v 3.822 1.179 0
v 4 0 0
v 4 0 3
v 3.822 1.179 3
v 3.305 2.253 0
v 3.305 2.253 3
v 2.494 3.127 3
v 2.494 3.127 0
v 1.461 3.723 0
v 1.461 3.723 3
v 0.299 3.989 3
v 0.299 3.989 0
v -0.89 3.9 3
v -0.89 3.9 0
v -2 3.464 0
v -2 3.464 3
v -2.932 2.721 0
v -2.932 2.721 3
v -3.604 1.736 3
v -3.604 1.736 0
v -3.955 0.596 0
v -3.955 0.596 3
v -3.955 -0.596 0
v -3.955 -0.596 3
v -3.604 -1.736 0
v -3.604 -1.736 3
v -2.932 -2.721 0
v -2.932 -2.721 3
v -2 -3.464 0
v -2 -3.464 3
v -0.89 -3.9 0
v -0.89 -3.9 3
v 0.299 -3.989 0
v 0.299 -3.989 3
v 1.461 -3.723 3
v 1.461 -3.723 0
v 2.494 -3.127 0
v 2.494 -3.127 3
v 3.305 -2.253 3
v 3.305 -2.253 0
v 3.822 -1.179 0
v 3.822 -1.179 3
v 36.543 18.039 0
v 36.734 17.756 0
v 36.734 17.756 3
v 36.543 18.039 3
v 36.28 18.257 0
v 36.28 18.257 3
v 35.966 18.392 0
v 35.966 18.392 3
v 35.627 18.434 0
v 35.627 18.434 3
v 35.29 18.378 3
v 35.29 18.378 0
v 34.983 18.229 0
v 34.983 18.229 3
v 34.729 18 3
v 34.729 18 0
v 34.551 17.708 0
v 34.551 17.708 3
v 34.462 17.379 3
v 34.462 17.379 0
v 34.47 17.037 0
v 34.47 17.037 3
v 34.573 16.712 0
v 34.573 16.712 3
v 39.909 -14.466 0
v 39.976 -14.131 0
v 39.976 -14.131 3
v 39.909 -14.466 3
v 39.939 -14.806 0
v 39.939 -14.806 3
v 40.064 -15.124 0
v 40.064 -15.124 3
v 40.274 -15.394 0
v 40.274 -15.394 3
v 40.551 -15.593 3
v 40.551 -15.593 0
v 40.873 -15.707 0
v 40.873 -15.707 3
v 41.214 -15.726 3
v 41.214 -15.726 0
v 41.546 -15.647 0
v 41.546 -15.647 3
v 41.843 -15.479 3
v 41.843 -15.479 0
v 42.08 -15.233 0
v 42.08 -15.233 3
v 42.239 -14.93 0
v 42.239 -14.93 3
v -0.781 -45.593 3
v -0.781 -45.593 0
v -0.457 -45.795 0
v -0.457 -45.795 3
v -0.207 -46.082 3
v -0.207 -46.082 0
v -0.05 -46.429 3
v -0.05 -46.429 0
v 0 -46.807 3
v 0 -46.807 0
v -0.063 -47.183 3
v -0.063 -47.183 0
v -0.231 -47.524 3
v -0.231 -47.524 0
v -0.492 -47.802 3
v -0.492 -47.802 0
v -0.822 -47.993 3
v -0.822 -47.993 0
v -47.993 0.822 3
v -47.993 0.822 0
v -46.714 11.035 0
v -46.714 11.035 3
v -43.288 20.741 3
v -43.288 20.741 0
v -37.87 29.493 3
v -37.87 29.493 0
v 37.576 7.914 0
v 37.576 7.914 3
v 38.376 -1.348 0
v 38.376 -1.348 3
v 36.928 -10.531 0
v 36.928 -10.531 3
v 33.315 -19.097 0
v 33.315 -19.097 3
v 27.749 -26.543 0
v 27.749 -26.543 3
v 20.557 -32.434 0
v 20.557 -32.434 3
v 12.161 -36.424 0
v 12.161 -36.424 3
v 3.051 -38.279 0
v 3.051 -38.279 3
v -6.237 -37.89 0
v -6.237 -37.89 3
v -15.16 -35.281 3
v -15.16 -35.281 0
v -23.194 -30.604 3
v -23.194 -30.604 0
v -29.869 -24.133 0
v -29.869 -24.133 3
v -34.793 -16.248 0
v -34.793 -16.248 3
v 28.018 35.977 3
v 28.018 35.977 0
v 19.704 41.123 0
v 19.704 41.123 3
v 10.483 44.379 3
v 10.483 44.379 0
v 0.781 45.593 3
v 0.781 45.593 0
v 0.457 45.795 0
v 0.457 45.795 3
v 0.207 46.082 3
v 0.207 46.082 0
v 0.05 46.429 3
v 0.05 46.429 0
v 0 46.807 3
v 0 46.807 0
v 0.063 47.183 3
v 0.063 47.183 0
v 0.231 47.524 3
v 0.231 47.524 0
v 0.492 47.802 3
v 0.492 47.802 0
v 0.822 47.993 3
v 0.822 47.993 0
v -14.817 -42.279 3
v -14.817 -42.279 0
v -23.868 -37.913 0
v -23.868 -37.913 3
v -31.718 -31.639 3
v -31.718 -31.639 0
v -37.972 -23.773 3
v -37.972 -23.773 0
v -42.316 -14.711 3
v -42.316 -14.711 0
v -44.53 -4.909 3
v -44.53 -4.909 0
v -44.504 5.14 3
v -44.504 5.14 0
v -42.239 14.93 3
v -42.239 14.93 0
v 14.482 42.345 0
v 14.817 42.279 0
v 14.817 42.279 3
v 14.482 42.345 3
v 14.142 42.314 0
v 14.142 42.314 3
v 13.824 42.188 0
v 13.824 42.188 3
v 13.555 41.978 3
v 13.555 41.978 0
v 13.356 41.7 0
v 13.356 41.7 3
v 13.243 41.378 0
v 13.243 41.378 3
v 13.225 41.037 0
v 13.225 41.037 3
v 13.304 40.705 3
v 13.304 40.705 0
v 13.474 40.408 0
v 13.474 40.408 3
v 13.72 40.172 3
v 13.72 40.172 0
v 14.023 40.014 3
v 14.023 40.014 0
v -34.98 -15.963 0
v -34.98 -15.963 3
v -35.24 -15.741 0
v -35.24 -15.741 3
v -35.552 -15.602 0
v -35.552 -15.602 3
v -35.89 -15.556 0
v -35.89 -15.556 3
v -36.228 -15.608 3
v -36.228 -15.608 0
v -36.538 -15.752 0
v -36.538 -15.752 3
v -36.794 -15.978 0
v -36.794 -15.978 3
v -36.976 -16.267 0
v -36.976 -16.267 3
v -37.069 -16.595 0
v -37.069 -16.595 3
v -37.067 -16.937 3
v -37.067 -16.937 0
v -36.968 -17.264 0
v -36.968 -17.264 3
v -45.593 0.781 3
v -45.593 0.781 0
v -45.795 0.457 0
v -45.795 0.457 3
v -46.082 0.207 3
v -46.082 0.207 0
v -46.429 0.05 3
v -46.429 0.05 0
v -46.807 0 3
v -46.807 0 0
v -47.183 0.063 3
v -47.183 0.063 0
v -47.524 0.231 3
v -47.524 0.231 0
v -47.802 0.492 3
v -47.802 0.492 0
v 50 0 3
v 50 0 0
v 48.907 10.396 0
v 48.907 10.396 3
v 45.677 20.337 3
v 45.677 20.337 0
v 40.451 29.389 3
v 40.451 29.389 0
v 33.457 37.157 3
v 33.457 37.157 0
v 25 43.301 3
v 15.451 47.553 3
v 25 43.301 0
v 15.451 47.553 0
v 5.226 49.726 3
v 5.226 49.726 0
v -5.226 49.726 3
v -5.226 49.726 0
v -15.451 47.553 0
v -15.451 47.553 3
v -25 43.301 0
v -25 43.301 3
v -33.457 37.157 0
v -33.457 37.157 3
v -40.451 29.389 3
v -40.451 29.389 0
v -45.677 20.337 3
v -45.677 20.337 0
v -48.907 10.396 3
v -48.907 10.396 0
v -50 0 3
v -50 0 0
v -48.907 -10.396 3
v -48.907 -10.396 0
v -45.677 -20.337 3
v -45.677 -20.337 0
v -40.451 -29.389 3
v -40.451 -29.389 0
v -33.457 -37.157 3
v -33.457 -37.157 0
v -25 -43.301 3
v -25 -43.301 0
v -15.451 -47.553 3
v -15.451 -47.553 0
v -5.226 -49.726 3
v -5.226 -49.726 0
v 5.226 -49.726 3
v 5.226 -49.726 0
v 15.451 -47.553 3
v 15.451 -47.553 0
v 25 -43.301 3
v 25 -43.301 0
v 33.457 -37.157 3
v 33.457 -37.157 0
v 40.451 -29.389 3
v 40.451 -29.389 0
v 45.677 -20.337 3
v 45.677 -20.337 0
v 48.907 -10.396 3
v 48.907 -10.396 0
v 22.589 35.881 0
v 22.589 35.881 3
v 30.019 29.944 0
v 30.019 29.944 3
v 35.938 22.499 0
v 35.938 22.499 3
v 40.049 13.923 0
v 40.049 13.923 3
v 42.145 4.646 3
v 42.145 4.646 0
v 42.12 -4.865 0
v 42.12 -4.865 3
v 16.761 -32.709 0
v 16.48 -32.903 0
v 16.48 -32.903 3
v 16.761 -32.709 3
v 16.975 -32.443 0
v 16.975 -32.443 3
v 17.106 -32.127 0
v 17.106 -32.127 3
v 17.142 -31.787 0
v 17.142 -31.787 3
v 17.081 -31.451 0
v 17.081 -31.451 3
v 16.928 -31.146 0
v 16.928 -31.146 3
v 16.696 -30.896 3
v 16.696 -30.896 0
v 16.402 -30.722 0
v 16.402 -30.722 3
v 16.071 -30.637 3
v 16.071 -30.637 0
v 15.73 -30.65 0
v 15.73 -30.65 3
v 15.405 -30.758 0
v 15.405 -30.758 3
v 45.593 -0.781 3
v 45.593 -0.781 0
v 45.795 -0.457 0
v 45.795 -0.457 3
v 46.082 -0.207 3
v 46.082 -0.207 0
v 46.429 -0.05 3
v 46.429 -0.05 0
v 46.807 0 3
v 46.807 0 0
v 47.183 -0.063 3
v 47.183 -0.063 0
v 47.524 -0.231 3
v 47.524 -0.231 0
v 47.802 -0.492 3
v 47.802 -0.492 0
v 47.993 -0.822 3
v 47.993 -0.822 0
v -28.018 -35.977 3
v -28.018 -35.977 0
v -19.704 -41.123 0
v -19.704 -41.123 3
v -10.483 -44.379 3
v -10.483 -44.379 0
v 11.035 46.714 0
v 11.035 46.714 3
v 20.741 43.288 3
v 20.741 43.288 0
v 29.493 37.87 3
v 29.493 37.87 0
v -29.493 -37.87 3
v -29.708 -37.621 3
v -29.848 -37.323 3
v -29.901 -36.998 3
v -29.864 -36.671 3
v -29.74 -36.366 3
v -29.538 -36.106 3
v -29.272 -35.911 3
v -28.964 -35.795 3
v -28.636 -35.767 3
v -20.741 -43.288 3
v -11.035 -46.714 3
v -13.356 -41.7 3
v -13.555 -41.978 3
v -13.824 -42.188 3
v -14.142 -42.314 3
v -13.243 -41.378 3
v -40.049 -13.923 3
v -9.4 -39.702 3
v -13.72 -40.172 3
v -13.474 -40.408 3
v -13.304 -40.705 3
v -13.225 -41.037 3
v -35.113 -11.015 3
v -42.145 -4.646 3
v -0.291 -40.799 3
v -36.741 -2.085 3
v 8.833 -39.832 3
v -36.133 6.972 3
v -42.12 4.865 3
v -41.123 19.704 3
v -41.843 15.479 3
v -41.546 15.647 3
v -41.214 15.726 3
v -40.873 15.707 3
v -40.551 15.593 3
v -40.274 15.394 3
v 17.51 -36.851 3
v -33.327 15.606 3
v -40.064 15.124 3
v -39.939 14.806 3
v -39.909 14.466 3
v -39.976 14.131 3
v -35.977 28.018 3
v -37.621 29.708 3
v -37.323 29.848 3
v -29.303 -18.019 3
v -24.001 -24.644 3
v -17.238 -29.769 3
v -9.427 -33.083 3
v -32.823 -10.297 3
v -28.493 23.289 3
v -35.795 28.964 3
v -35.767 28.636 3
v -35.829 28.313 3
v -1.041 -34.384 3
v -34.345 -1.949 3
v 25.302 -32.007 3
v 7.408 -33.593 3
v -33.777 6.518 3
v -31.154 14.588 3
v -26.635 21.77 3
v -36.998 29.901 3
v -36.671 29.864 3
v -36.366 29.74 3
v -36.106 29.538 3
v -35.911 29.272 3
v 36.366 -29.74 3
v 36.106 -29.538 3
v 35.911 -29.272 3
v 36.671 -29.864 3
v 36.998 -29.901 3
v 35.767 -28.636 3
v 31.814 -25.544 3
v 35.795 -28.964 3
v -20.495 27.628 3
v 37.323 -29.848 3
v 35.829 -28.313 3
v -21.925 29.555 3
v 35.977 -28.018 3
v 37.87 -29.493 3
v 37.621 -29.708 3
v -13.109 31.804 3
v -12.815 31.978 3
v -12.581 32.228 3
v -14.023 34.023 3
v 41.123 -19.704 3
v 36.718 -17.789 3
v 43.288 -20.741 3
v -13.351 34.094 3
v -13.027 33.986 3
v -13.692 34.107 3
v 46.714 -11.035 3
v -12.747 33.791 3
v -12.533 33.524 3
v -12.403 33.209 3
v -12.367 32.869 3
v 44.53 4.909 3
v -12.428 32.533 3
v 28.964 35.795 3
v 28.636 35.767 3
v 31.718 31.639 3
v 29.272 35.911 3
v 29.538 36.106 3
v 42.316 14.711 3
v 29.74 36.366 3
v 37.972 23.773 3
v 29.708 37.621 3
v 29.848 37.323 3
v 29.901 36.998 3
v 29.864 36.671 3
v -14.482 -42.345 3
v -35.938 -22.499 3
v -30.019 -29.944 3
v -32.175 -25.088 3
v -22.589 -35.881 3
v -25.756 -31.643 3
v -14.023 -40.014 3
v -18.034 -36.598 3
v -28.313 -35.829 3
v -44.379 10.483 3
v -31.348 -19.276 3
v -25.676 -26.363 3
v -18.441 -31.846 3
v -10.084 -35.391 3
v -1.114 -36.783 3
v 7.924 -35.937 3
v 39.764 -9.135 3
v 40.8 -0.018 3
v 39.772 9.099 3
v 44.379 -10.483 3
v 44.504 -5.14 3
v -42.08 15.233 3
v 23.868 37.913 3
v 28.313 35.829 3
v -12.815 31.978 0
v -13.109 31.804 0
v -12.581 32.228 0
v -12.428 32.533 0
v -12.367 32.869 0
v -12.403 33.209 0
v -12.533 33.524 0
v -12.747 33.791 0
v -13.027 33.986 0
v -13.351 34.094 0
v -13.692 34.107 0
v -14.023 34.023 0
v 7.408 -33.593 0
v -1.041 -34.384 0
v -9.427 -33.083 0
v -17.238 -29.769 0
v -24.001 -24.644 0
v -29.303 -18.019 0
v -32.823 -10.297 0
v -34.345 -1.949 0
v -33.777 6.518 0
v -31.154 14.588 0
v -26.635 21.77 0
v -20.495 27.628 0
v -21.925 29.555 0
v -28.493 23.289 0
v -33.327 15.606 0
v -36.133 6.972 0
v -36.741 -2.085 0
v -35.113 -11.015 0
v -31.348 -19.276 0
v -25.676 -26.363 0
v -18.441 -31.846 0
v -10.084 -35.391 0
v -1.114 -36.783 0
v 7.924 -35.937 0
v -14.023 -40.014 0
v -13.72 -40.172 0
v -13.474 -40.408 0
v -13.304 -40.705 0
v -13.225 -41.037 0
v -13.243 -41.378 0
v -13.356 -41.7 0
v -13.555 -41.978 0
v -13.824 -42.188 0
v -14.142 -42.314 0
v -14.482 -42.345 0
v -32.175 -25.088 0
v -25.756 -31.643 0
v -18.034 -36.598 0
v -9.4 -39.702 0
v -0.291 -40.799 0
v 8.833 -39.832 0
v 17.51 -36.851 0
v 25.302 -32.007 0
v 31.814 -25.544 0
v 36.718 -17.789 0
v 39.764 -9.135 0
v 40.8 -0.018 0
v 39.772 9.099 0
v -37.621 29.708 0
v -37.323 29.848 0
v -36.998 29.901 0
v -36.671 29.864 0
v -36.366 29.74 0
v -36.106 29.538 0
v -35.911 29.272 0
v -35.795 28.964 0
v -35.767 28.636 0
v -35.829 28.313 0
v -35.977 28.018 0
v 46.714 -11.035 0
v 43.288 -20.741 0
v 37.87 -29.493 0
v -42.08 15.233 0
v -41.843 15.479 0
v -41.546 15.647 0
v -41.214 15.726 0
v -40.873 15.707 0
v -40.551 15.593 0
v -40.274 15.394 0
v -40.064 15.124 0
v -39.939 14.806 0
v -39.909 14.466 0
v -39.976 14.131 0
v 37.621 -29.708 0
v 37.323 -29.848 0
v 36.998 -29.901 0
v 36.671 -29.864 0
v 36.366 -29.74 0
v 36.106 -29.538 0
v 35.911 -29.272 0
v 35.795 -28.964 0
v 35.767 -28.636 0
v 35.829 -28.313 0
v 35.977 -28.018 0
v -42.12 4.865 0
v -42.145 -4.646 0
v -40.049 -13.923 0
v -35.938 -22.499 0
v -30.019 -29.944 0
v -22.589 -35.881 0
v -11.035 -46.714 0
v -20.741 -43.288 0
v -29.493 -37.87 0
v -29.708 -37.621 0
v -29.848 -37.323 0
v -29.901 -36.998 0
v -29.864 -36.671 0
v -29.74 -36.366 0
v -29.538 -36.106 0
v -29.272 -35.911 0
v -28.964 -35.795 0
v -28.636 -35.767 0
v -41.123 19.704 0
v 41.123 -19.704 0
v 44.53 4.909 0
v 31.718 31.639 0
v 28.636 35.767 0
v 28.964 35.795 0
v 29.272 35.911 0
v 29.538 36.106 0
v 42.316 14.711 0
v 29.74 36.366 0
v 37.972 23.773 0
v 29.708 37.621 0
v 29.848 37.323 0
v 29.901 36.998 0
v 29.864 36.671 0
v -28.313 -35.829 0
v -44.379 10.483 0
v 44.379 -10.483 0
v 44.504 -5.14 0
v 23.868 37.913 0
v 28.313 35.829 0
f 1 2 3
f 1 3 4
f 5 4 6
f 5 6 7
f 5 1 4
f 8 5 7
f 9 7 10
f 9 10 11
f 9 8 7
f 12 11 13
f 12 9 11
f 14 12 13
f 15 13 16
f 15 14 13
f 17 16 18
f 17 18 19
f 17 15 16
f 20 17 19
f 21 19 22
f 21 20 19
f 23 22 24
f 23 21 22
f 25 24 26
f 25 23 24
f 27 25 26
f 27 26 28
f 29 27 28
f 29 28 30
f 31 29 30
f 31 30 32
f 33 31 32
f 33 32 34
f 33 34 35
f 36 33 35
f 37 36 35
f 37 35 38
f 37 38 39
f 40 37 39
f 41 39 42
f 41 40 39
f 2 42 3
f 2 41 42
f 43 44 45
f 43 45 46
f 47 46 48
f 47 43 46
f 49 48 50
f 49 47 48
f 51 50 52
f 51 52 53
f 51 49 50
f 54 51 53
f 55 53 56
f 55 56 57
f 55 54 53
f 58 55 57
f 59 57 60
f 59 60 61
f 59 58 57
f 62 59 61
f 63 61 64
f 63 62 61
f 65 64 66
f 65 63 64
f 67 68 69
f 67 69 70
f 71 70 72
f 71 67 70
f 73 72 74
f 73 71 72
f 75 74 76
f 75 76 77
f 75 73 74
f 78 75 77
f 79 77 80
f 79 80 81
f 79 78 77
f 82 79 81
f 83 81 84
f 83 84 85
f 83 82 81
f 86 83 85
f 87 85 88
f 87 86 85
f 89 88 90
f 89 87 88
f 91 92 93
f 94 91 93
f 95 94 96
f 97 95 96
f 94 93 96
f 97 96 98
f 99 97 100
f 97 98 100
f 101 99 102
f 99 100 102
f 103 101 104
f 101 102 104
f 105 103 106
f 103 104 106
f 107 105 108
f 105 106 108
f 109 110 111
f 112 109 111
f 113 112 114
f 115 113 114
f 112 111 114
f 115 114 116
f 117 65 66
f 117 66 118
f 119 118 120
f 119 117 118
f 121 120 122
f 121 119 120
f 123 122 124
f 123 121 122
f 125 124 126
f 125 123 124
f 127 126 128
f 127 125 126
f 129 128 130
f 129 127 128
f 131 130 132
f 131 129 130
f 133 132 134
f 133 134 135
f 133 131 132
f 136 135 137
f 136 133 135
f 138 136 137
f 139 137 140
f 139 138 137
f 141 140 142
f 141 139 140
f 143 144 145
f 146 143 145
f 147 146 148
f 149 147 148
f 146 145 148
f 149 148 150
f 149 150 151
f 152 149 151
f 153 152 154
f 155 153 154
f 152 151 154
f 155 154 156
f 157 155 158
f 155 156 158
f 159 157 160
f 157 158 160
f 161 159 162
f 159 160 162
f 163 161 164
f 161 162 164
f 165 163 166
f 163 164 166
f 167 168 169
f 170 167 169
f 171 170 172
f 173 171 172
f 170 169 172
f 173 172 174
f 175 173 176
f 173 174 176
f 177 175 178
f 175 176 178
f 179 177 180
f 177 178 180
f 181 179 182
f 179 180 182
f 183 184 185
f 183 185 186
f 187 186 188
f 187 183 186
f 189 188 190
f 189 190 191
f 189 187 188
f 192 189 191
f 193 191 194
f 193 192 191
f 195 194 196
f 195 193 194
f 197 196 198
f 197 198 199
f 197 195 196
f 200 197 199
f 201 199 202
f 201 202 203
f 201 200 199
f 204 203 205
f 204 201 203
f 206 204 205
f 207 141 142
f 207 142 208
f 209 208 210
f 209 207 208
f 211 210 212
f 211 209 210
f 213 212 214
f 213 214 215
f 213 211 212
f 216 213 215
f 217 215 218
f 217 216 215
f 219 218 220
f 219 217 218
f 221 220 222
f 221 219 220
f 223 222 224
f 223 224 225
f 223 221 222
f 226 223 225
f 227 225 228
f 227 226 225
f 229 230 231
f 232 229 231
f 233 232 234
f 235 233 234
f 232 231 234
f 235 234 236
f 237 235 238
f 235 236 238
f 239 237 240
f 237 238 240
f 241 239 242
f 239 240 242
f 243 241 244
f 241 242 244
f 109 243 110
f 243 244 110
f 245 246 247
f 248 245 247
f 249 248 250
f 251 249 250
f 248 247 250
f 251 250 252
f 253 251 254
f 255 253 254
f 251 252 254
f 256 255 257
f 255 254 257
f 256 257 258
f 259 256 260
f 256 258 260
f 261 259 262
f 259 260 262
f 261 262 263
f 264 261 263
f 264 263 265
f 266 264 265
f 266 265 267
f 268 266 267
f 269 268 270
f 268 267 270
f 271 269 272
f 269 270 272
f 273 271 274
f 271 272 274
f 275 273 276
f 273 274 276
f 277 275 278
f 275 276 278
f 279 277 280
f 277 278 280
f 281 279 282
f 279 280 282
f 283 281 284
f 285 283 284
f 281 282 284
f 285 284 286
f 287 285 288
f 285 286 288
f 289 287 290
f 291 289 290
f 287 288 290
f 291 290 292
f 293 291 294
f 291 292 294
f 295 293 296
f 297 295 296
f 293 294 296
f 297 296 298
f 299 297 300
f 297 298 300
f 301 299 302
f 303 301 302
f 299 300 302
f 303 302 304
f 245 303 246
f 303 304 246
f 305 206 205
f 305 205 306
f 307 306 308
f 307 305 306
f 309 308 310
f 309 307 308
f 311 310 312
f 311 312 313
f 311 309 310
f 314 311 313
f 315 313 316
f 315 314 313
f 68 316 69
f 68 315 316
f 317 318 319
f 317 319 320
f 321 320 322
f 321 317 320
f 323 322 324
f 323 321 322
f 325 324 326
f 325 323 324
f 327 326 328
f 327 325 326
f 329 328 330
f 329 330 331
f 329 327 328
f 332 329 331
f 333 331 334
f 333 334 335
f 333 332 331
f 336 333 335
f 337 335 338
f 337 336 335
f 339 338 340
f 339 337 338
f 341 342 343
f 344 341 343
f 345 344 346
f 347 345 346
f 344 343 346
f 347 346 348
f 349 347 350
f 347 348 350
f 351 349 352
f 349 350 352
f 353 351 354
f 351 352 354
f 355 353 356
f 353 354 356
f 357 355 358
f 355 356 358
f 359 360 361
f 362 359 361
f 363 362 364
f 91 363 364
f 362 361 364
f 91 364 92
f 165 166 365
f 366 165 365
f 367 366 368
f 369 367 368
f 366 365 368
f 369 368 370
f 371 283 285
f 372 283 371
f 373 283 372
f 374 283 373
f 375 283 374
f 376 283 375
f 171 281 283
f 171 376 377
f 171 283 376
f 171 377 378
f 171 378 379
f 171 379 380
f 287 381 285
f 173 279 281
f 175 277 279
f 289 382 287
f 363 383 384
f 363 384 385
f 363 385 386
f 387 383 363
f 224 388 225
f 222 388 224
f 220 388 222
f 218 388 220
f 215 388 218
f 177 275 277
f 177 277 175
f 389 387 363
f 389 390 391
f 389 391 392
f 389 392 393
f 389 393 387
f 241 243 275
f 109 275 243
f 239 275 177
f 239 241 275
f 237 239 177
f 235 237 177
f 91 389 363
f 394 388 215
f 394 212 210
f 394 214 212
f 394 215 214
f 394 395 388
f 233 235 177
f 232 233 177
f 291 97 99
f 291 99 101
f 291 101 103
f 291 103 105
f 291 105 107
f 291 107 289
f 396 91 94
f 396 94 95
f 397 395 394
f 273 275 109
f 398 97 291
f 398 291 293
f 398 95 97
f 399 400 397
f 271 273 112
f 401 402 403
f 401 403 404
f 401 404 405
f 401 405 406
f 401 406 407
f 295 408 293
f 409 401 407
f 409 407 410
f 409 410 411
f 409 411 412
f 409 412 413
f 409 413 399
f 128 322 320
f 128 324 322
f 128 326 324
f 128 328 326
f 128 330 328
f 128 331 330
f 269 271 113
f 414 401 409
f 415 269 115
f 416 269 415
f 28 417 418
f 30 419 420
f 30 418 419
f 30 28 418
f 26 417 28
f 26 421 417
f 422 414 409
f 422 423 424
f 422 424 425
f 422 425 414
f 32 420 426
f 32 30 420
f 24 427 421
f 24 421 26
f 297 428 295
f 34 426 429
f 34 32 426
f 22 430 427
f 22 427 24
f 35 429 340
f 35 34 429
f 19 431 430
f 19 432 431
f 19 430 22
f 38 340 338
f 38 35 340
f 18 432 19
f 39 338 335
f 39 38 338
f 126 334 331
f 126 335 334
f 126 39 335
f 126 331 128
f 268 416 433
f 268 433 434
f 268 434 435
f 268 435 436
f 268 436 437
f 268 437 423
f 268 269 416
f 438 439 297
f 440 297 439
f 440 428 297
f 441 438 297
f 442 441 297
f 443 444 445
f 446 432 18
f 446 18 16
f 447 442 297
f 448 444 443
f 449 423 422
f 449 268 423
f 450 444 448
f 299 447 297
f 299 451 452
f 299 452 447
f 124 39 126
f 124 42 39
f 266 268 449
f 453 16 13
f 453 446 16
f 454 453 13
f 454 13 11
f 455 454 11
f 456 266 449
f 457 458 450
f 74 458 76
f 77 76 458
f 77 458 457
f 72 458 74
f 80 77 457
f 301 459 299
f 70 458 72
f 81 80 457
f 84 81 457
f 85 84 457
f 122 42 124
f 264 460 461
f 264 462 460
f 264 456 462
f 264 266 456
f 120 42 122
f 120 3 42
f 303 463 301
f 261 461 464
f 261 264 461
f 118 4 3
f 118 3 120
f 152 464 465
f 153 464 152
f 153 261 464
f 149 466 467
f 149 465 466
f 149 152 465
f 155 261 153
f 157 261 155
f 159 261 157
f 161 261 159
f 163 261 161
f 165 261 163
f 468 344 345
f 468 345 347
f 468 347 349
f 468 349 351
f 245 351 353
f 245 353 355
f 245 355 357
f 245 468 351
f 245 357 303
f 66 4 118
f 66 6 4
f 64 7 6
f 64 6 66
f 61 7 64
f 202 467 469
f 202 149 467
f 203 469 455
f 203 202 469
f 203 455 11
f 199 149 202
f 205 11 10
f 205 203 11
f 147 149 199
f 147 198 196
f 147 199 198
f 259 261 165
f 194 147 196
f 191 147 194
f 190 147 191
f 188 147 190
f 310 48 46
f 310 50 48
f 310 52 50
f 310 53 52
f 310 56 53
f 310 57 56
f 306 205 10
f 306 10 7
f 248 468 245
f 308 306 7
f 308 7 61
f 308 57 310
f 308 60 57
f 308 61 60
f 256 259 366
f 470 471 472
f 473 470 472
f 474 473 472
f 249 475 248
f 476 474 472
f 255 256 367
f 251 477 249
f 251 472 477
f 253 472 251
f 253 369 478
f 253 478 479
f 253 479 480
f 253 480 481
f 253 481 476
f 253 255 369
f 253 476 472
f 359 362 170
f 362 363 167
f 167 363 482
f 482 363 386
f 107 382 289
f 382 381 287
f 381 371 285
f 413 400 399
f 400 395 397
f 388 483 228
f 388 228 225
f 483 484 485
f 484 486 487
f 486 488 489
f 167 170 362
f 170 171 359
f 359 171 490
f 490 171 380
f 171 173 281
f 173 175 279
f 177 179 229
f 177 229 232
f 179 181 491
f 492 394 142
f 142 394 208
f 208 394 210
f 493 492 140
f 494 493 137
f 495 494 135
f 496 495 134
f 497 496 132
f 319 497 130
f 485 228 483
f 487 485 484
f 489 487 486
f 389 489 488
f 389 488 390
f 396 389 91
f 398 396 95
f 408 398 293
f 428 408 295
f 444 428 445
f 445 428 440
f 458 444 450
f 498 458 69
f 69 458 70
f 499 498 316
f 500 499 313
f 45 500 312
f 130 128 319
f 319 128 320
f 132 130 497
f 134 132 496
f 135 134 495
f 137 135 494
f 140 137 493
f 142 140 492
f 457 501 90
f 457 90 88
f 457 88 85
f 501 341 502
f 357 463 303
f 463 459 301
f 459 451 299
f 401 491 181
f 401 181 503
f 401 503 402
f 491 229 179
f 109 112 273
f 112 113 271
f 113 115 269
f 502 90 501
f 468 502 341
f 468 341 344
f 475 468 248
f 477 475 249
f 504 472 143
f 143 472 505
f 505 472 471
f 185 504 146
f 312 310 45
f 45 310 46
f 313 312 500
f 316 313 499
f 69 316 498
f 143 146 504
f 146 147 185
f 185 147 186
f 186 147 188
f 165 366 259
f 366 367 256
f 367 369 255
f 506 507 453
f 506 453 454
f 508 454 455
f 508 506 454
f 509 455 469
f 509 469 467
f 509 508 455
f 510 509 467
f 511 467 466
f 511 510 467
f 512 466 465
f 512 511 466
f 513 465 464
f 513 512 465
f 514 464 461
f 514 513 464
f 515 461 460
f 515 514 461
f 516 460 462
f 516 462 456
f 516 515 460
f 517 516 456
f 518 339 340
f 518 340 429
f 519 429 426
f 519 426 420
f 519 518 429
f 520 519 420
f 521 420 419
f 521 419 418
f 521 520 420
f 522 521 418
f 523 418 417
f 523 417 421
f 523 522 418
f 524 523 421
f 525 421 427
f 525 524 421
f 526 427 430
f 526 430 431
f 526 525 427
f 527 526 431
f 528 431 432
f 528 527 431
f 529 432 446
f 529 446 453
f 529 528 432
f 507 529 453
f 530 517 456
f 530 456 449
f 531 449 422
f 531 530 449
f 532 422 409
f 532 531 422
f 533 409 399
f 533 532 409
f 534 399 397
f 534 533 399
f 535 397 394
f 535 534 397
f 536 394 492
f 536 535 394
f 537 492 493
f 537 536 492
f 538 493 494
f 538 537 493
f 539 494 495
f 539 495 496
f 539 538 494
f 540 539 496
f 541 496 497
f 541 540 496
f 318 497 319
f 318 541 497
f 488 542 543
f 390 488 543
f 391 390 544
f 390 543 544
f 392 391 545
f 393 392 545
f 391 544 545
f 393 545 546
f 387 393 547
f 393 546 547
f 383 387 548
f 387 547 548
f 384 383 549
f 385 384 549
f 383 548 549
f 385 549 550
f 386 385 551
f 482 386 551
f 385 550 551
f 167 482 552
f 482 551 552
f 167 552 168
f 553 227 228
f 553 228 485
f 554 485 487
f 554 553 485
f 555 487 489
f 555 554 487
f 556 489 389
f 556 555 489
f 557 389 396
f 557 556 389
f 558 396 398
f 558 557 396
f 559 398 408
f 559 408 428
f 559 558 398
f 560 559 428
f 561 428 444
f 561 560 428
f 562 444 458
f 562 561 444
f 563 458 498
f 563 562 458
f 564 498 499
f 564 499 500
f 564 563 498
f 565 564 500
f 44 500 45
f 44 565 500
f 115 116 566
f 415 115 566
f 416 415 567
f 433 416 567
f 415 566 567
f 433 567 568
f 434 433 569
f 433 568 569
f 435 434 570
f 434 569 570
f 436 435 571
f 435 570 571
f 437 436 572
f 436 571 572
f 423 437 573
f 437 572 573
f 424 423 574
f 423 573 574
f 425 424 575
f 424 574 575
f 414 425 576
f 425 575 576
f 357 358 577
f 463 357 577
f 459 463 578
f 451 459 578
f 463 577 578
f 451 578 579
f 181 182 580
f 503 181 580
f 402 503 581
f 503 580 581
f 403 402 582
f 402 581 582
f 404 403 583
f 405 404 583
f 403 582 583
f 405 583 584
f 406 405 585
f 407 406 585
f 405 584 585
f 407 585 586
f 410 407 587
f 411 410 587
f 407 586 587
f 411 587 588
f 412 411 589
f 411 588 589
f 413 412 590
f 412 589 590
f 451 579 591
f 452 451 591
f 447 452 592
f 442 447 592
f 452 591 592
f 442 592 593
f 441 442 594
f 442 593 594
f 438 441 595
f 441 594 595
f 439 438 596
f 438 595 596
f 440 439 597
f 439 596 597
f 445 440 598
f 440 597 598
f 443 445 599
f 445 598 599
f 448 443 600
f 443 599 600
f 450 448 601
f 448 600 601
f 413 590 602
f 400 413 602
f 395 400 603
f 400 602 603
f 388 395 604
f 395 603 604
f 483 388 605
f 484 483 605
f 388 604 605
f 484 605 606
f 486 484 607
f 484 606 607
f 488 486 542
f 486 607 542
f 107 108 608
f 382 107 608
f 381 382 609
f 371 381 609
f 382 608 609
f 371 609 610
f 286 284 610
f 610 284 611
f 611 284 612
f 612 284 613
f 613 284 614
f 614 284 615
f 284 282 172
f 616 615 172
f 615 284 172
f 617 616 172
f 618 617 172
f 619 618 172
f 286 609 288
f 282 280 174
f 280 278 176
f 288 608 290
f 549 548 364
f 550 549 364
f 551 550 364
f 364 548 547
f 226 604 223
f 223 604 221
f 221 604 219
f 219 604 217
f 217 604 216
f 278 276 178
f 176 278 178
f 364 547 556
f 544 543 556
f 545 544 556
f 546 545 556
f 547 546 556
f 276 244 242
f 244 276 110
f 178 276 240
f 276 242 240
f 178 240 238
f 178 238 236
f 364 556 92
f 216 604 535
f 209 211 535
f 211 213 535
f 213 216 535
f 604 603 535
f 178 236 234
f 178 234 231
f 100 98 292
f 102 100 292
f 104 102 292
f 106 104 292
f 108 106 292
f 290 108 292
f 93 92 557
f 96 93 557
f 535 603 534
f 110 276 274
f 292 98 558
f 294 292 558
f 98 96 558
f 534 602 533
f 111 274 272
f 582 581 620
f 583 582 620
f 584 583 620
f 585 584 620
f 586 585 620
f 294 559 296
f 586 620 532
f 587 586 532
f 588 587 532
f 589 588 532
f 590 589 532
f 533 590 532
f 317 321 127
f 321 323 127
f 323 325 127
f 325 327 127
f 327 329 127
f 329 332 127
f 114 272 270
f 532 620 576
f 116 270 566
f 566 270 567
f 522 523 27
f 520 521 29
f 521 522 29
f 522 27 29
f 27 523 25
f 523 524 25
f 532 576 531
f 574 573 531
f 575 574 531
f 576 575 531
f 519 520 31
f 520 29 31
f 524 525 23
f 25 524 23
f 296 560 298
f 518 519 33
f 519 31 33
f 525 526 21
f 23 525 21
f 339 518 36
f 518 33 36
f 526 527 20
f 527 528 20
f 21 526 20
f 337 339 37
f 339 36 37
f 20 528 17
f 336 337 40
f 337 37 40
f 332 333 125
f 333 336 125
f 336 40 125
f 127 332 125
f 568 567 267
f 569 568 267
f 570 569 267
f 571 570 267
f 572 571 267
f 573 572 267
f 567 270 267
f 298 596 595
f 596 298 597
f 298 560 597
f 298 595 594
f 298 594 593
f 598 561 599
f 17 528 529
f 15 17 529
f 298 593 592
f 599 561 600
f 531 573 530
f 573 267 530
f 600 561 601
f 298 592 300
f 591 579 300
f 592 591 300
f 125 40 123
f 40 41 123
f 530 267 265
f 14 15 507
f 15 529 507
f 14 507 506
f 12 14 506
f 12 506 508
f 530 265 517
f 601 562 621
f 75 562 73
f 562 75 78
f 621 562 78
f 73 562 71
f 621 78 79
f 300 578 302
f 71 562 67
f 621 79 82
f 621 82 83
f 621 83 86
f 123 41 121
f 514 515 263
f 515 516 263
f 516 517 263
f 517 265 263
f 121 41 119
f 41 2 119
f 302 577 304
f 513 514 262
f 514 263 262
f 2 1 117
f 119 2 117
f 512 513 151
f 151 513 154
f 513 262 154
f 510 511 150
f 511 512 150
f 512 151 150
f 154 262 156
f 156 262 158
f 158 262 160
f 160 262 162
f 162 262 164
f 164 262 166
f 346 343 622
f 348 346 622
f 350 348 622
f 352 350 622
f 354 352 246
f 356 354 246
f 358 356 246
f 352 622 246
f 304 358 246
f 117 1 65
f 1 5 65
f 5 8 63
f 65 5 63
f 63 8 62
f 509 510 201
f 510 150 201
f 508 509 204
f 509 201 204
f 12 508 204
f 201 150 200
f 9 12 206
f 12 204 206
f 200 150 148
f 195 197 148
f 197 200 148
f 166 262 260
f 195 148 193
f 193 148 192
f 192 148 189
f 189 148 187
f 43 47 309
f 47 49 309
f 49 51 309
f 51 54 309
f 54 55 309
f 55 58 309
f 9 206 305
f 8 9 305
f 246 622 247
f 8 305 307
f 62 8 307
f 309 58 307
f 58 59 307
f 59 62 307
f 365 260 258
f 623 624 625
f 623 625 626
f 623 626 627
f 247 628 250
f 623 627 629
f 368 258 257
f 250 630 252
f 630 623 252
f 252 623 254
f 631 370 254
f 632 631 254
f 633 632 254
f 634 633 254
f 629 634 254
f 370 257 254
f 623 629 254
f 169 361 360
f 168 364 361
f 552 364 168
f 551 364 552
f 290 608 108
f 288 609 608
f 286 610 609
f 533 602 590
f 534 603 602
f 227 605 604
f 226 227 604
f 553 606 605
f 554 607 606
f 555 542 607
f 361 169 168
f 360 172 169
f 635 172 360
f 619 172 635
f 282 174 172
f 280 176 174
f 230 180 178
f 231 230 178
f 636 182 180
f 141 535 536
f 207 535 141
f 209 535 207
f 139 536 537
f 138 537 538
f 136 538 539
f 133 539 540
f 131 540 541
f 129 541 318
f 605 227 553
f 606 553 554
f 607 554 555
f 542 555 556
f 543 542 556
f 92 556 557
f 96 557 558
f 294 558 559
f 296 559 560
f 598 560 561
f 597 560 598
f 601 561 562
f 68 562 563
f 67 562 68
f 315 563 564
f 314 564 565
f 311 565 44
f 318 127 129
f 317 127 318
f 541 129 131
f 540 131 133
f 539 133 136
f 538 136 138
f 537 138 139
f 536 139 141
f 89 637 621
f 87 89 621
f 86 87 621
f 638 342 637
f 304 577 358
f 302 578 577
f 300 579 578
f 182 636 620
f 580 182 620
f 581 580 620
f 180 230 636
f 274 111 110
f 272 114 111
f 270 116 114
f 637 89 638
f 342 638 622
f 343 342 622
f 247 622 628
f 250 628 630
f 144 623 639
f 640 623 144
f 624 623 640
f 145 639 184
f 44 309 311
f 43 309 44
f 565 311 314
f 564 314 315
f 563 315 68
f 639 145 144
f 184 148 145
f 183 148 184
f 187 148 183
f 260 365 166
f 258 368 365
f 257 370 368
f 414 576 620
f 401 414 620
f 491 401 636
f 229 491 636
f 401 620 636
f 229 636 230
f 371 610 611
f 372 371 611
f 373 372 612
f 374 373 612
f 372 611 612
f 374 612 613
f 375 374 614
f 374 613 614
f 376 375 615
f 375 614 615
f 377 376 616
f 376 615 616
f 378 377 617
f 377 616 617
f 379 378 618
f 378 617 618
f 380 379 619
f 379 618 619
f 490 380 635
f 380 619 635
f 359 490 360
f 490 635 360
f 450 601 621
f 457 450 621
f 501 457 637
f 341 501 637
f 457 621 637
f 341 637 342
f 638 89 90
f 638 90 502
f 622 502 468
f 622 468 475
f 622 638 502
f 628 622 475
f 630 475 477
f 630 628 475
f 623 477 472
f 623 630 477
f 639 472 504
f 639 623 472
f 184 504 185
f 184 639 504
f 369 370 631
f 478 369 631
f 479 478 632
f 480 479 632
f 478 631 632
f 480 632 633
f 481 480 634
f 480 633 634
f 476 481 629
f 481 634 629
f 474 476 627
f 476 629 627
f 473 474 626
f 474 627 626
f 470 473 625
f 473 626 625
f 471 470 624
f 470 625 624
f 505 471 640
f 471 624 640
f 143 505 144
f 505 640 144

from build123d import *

# Parameters (mm, degrees)
CROQUIS1_R              = 50
CROQUIS1_R_2            = 4
SALIENTE_EXTRUIR3_DEPTH = 3


with BuildPart() as part:
    # Croquis1 → Saliente-Extruir3 (new body)
    with BuildSketch(Plane.XY):
        Circle(CROQUIS1_R)
        Circle(CROQUIS1_R_2, mode=Mode.SUBTRACT)
        with BuildLine():
            ThreePointArc((0.780784951, 45.593315024), (0.000190465, 46.806858641), (0.821878896, 47.992963183))
            ThreePointArc((0.821878896, 47.992963183), (15.980042003, 45.261885263), (29.492838566, 37.870469674))
            ThreePointArc((29.492838566, 37.870469674), (29.647643774, 36.228936164), (28.018196638, 35.97694619))
            ThreePointArc((28.018196638, 35.97694619), (15.181039903, 42.998791), (0.780784951, 45.593315024))
        make_face(mode=Mode.SUBTRACT)
        with BuildLine():
            ThreePointArc((35.97694619, -28.018196638), (42.998791, -15.181039903), (45.593315024, -0.780784951))
            ThreePointArc((45.593315024, -0.780784951), (46.806858641, -0.000190465), (47.992963183, -0.821878896))
            ThreePointArc((47.992963183, -0.821878896), (45.261885263, -15.980042003), (37.870469674, -29.492838566))
            ThreePointArc((37.870469674, -29.492838566), (36.228936164, -29.647643774), (35.97694619, -28.018196638))
        make_face(mode=Mode.SUBTRACT)
        with BuildLine():
            ThreePointArc((-28.018196638, -35.97694619), (-15.181039903, -42.998791), (-0.780784951, -45.593315024))
            ThreePointArc((-0.780784951, -45.593315024), (-0.000190465, -46.806858641), (-0.821878896, -47.992963183))
            ThreePointArc((-0.821878896, -47.992963183), (-15.980042003, -45.261885263), (-29.492838566, -37.870469674))
            ThreePointArc((-29.492838566, -37.870469674), (-29.647643774, -36.228936164), (-28.018196638, -35.97694619))
        make_face(mode=Mode.SUBTRACT)
        with BuildLine():
            ThreePointArc((-35.97694619, 28.018196638), (-42.998791, 15.181039903), (-45.593315024, 0.780784951))
            ThreePointArc((-45.593315024, 0.780784951), (-46.806858641, 0.000190465), (-47.992963183, 0.821878896))
            ThreePointArc((-47.992963183, 0.821878896), (-45.261885263, 15.980042003), (-37.870469674, 29.492838566))
            ThreePointArc((-37.870469674, 29.492838566), (-36.228936164, 29.647643774), (-35.97694619, 28.018196638))
        make_face(mode=Mode.SUBTRACT)
        with BuildLine():
            ThreePointArc((42.238881445, -14.930401679), (40.398847807, 19.364222056), (14.817024573, 42.27878644))
            ThreePointArc((14.817024573, 42.27878644), (13.287672492, 41.543203533), (14.023255399, 40.013851452))
            ThreePointArc((14.023255399, 40.013851452), (38.234623818, 18.326853017), (39.976084224, -14.130558732))
            ThreePointArc((39.976084224, -14.130558732), (40.707561361, -15.661878816), (42.238881445, -14.930401679))
        make_face(mode=Mode.SUBTRACT)
        with BuildLine():
            ThreePointArc((-39.976084224, 14.130558732), (-38.234623818, -18.326853017), (-14.023255399, -40.013851452))
            ThreePointArc((-14.023255399, -40.013851452), (-13.287672492, -41.543203533), (-14.817024573, -42.27878644))
            ThreePointArc((-14.817024573, -42.27878644), (-40.398847807, -19.364222056), (-42.238881445, 14.930401679))
            ThreePointArc((-42.238881445, 14.930401679), (-40.707561361, 15.661878816), (-39.976084224, 14.130558732))
        make_face(mode=Mode.SUBTRACT)
        with BuildLine():
            ThreePointArc((-36.967560027, -17.263820715), (17.510315589, -36.851442957), (36.733682313, 17.756029503))
            ThreePointArc((36.733682313, 17.756029503), (35.13104373, 18.314195762), (34.572877471, 16.711557179))
            ThreePointArc((34.572877471, 16.711557179), (16.480297025, -34.683711018), (-34.792997672, -16.248301849))
            ThreePointArc((-34.792997672, -16.248301849), (-36.388038282, -15.668780105), (-36.967560027, -17.263820715))
        make_face(mode=Mode.SUBTRACT)
        with BuildLine():
            ThreePointArc((-14.023255399, 34.023349453), (-33.48596426, -15.262050897), (16.480297025, -32.903492368))
            ThreePointArc((16.480297025, -32.903492368), (17.015836003, -31.293151409), (15.405495045, -30.75761243))
            ThreePointArc((15.405495045, -30.75761243), (-31.302097025, -14.266699752), (-13.108695264, 31.804435358))
            ThreePointArc((-13.108695264, 31.804435358), (-12.456518284, 33.371172473), (-14.023255399, 34.023349453))
        make_face(mode=Mode.SUBTRACT)
    extrude(amount=SALIENTE_EXTRUIR3_DEPTH)


solid = part.part
